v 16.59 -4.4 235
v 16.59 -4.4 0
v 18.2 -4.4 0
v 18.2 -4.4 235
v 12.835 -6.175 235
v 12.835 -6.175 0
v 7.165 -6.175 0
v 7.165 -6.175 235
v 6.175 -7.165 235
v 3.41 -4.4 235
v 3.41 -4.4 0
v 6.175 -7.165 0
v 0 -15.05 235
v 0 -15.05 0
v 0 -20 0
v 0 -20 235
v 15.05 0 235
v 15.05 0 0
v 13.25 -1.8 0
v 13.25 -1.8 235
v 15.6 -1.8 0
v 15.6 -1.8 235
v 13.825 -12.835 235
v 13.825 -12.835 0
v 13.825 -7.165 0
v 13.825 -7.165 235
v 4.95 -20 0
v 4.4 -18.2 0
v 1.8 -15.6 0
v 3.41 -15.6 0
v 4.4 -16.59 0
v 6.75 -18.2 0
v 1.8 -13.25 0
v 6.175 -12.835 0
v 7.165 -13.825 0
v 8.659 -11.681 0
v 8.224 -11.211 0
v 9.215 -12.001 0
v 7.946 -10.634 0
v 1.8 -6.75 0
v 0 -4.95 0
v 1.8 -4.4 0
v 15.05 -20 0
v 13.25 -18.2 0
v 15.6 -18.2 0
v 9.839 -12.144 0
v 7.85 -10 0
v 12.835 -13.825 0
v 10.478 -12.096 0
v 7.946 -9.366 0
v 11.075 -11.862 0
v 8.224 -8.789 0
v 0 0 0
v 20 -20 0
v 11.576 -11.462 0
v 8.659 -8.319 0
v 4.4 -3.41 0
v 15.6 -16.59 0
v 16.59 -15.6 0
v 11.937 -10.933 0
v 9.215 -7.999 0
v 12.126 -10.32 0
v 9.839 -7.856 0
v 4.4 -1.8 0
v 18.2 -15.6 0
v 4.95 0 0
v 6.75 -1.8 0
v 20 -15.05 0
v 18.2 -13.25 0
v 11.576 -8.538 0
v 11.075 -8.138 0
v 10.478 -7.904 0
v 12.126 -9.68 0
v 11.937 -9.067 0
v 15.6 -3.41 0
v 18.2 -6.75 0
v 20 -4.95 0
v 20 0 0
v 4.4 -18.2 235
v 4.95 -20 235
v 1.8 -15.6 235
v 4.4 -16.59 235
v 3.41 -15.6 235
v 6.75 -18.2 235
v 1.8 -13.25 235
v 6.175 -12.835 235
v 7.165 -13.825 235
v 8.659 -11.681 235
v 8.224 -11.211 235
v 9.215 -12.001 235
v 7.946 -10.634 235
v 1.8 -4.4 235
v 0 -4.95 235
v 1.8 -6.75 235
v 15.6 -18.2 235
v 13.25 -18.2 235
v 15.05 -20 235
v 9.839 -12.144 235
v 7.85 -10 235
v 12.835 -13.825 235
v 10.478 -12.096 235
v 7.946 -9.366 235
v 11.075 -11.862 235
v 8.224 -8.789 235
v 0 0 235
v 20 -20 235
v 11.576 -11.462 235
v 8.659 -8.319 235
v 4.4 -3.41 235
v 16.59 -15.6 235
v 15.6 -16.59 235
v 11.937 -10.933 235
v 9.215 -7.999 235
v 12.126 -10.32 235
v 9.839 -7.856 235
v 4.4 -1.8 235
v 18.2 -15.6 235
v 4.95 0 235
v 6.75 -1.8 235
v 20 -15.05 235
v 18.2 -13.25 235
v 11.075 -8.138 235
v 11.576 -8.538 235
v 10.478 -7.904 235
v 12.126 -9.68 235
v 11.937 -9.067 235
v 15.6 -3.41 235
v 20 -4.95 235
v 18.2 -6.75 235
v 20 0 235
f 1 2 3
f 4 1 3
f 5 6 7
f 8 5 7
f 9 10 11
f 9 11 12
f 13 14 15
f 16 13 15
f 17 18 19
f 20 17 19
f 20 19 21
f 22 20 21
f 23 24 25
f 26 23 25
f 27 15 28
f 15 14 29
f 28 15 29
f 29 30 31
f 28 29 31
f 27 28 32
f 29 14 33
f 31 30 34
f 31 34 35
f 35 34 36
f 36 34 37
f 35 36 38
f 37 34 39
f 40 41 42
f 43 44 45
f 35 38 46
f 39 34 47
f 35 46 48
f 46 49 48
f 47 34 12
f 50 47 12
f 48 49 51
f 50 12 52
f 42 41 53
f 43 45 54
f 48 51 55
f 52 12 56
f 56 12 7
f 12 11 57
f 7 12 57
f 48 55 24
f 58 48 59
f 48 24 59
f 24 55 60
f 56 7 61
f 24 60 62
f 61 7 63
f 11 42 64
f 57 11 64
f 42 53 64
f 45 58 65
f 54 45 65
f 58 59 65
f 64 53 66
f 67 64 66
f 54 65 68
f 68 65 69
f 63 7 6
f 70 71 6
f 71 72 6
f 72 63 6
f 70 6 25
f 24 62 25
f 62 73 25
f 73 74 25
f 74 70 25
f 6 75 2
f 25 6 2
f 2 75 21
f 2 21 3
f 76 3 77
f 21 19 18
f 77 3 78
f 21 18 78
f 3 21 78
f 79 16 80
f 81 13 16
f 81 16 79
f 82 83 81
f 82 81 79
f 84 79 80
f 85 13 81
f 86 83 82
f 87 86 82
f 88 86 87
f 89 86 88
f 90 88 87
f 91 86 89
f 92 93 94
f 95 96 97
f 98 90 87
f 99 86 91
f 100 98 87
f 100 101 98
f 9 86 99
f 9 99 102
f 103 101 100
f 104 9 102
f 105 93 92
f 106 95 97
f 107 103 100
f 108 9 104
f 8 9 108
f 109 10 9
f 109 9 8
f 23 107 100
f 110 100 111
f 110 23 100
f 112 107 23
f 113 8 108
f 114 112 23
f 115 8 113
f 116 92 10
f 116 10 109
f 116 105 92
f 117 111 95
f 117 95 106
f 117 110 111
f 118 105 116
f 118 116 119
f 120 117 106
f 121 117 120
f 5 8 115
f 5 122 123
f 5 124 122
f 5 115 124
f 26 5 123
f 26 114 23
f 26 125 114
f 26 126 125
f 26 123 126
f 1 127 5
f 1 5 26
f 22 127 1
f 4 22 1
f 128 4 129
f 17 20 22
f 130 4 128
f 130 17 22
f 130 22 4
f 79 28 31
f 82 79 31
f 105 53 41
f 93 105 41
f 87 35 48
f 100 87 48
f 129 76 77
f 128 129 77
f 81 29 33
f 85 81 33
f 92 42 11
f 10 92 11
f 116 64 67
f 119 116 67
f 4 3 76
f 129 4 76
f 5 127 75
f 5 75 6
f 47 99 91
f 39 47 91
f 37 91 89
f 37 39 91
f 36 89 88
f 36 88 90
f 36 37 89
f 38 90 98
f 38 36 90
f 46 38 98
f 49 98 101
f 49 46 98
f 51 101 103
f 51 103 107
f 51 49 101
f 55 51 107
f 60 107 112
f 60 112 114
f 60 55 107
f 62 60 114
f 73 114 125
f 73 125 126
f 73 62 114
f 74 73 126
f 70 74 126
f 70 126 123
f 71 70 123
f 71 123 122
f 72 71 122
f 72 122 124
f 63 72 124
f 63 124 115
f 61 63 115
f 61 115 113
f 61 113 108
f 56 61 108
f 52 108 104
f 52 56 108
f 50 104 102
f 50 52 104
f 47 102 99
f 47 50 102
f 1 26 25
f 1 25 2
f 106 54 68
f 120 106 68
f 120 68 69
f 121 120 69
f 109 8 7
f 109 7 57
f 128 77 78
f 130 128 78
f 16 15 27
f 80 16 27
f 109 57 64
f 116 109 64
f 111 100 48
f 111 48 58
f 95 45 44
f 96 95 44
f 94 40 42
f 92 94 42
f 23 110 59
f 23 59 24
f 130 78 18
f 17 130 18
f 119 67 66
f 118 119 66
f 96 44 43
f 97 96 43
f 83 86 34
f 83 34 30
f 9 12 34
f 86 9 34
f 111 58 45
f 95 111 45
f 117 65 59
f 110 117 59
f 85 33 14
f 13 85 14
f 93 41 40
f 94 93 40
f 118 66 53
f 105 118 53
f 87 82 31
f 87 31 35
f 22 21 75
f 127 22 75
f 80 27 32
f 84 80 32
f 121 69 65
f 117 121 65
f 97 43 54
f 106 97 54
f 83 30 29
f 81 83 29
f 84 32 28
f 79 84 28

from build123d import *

# Parameters (mm, degrees)
CROQUIS1_R      = 2.15
BOSCHBASE_DEPTH = 235


with BuildPart() as part:
    # Croquis1 → BoschBase (new body)
    with BuildSketch(Plane.XY):
        Polygon((4.4, 0), (0, 0), (0, -0.56736664), (0, -4.4), (0, -4.95), (1.8, -6.75), (1.8, -4.4), (3.410050506, -4.4), (6.175, -7.164949494), (6.175, -12.835050506), (3.410050506, -15.6), (1.8, -15.6), (1.8, -13.25), (0, -15.05), (0, -15.6), (0, -20), (4.4, -20), (4.95, -20), (6.75, -18.2), (4.4, -18.2), (4.4, -16.589949494), (7.164949494, -13.825), (12.835050506, -13.825), (15.6, -16.589949494), (15.6, -18.2), (13.25, -18.2), (15.05, -20), (15.6, -20), (18.2, -20), (20, -20), (20, -15.6), (20, -15.05), (18.2, -13.25), (18.2, -15.6), (16.589949494, -15.6), (13.825, -12.835050506), (13.825, -7.164949494), (16.589949494, -4.4), (18.2, -4.4), (18.2, -6.75), (20, -4.95), (20, -4.4), (20, 0), (15.6, 0), (15.05, 0), (13.25, -1.8), (15.6, -1.8), (15.6, -3.410050506), (12.835050506, -6.175), (7.164949494, -6.175), (4.4, -3.410050506), (4.4, -1.8), (6.75, -1.8), (4.95, 0), align=None)
        with Locations(Location((10, -10, 0), (0, 0, 180))):
            Circle(CROQUIS1_R, mode=Mode.SUBTRACT)
    extrude(amount=BOSCHBASE_DEPTH)


solid = part.part
